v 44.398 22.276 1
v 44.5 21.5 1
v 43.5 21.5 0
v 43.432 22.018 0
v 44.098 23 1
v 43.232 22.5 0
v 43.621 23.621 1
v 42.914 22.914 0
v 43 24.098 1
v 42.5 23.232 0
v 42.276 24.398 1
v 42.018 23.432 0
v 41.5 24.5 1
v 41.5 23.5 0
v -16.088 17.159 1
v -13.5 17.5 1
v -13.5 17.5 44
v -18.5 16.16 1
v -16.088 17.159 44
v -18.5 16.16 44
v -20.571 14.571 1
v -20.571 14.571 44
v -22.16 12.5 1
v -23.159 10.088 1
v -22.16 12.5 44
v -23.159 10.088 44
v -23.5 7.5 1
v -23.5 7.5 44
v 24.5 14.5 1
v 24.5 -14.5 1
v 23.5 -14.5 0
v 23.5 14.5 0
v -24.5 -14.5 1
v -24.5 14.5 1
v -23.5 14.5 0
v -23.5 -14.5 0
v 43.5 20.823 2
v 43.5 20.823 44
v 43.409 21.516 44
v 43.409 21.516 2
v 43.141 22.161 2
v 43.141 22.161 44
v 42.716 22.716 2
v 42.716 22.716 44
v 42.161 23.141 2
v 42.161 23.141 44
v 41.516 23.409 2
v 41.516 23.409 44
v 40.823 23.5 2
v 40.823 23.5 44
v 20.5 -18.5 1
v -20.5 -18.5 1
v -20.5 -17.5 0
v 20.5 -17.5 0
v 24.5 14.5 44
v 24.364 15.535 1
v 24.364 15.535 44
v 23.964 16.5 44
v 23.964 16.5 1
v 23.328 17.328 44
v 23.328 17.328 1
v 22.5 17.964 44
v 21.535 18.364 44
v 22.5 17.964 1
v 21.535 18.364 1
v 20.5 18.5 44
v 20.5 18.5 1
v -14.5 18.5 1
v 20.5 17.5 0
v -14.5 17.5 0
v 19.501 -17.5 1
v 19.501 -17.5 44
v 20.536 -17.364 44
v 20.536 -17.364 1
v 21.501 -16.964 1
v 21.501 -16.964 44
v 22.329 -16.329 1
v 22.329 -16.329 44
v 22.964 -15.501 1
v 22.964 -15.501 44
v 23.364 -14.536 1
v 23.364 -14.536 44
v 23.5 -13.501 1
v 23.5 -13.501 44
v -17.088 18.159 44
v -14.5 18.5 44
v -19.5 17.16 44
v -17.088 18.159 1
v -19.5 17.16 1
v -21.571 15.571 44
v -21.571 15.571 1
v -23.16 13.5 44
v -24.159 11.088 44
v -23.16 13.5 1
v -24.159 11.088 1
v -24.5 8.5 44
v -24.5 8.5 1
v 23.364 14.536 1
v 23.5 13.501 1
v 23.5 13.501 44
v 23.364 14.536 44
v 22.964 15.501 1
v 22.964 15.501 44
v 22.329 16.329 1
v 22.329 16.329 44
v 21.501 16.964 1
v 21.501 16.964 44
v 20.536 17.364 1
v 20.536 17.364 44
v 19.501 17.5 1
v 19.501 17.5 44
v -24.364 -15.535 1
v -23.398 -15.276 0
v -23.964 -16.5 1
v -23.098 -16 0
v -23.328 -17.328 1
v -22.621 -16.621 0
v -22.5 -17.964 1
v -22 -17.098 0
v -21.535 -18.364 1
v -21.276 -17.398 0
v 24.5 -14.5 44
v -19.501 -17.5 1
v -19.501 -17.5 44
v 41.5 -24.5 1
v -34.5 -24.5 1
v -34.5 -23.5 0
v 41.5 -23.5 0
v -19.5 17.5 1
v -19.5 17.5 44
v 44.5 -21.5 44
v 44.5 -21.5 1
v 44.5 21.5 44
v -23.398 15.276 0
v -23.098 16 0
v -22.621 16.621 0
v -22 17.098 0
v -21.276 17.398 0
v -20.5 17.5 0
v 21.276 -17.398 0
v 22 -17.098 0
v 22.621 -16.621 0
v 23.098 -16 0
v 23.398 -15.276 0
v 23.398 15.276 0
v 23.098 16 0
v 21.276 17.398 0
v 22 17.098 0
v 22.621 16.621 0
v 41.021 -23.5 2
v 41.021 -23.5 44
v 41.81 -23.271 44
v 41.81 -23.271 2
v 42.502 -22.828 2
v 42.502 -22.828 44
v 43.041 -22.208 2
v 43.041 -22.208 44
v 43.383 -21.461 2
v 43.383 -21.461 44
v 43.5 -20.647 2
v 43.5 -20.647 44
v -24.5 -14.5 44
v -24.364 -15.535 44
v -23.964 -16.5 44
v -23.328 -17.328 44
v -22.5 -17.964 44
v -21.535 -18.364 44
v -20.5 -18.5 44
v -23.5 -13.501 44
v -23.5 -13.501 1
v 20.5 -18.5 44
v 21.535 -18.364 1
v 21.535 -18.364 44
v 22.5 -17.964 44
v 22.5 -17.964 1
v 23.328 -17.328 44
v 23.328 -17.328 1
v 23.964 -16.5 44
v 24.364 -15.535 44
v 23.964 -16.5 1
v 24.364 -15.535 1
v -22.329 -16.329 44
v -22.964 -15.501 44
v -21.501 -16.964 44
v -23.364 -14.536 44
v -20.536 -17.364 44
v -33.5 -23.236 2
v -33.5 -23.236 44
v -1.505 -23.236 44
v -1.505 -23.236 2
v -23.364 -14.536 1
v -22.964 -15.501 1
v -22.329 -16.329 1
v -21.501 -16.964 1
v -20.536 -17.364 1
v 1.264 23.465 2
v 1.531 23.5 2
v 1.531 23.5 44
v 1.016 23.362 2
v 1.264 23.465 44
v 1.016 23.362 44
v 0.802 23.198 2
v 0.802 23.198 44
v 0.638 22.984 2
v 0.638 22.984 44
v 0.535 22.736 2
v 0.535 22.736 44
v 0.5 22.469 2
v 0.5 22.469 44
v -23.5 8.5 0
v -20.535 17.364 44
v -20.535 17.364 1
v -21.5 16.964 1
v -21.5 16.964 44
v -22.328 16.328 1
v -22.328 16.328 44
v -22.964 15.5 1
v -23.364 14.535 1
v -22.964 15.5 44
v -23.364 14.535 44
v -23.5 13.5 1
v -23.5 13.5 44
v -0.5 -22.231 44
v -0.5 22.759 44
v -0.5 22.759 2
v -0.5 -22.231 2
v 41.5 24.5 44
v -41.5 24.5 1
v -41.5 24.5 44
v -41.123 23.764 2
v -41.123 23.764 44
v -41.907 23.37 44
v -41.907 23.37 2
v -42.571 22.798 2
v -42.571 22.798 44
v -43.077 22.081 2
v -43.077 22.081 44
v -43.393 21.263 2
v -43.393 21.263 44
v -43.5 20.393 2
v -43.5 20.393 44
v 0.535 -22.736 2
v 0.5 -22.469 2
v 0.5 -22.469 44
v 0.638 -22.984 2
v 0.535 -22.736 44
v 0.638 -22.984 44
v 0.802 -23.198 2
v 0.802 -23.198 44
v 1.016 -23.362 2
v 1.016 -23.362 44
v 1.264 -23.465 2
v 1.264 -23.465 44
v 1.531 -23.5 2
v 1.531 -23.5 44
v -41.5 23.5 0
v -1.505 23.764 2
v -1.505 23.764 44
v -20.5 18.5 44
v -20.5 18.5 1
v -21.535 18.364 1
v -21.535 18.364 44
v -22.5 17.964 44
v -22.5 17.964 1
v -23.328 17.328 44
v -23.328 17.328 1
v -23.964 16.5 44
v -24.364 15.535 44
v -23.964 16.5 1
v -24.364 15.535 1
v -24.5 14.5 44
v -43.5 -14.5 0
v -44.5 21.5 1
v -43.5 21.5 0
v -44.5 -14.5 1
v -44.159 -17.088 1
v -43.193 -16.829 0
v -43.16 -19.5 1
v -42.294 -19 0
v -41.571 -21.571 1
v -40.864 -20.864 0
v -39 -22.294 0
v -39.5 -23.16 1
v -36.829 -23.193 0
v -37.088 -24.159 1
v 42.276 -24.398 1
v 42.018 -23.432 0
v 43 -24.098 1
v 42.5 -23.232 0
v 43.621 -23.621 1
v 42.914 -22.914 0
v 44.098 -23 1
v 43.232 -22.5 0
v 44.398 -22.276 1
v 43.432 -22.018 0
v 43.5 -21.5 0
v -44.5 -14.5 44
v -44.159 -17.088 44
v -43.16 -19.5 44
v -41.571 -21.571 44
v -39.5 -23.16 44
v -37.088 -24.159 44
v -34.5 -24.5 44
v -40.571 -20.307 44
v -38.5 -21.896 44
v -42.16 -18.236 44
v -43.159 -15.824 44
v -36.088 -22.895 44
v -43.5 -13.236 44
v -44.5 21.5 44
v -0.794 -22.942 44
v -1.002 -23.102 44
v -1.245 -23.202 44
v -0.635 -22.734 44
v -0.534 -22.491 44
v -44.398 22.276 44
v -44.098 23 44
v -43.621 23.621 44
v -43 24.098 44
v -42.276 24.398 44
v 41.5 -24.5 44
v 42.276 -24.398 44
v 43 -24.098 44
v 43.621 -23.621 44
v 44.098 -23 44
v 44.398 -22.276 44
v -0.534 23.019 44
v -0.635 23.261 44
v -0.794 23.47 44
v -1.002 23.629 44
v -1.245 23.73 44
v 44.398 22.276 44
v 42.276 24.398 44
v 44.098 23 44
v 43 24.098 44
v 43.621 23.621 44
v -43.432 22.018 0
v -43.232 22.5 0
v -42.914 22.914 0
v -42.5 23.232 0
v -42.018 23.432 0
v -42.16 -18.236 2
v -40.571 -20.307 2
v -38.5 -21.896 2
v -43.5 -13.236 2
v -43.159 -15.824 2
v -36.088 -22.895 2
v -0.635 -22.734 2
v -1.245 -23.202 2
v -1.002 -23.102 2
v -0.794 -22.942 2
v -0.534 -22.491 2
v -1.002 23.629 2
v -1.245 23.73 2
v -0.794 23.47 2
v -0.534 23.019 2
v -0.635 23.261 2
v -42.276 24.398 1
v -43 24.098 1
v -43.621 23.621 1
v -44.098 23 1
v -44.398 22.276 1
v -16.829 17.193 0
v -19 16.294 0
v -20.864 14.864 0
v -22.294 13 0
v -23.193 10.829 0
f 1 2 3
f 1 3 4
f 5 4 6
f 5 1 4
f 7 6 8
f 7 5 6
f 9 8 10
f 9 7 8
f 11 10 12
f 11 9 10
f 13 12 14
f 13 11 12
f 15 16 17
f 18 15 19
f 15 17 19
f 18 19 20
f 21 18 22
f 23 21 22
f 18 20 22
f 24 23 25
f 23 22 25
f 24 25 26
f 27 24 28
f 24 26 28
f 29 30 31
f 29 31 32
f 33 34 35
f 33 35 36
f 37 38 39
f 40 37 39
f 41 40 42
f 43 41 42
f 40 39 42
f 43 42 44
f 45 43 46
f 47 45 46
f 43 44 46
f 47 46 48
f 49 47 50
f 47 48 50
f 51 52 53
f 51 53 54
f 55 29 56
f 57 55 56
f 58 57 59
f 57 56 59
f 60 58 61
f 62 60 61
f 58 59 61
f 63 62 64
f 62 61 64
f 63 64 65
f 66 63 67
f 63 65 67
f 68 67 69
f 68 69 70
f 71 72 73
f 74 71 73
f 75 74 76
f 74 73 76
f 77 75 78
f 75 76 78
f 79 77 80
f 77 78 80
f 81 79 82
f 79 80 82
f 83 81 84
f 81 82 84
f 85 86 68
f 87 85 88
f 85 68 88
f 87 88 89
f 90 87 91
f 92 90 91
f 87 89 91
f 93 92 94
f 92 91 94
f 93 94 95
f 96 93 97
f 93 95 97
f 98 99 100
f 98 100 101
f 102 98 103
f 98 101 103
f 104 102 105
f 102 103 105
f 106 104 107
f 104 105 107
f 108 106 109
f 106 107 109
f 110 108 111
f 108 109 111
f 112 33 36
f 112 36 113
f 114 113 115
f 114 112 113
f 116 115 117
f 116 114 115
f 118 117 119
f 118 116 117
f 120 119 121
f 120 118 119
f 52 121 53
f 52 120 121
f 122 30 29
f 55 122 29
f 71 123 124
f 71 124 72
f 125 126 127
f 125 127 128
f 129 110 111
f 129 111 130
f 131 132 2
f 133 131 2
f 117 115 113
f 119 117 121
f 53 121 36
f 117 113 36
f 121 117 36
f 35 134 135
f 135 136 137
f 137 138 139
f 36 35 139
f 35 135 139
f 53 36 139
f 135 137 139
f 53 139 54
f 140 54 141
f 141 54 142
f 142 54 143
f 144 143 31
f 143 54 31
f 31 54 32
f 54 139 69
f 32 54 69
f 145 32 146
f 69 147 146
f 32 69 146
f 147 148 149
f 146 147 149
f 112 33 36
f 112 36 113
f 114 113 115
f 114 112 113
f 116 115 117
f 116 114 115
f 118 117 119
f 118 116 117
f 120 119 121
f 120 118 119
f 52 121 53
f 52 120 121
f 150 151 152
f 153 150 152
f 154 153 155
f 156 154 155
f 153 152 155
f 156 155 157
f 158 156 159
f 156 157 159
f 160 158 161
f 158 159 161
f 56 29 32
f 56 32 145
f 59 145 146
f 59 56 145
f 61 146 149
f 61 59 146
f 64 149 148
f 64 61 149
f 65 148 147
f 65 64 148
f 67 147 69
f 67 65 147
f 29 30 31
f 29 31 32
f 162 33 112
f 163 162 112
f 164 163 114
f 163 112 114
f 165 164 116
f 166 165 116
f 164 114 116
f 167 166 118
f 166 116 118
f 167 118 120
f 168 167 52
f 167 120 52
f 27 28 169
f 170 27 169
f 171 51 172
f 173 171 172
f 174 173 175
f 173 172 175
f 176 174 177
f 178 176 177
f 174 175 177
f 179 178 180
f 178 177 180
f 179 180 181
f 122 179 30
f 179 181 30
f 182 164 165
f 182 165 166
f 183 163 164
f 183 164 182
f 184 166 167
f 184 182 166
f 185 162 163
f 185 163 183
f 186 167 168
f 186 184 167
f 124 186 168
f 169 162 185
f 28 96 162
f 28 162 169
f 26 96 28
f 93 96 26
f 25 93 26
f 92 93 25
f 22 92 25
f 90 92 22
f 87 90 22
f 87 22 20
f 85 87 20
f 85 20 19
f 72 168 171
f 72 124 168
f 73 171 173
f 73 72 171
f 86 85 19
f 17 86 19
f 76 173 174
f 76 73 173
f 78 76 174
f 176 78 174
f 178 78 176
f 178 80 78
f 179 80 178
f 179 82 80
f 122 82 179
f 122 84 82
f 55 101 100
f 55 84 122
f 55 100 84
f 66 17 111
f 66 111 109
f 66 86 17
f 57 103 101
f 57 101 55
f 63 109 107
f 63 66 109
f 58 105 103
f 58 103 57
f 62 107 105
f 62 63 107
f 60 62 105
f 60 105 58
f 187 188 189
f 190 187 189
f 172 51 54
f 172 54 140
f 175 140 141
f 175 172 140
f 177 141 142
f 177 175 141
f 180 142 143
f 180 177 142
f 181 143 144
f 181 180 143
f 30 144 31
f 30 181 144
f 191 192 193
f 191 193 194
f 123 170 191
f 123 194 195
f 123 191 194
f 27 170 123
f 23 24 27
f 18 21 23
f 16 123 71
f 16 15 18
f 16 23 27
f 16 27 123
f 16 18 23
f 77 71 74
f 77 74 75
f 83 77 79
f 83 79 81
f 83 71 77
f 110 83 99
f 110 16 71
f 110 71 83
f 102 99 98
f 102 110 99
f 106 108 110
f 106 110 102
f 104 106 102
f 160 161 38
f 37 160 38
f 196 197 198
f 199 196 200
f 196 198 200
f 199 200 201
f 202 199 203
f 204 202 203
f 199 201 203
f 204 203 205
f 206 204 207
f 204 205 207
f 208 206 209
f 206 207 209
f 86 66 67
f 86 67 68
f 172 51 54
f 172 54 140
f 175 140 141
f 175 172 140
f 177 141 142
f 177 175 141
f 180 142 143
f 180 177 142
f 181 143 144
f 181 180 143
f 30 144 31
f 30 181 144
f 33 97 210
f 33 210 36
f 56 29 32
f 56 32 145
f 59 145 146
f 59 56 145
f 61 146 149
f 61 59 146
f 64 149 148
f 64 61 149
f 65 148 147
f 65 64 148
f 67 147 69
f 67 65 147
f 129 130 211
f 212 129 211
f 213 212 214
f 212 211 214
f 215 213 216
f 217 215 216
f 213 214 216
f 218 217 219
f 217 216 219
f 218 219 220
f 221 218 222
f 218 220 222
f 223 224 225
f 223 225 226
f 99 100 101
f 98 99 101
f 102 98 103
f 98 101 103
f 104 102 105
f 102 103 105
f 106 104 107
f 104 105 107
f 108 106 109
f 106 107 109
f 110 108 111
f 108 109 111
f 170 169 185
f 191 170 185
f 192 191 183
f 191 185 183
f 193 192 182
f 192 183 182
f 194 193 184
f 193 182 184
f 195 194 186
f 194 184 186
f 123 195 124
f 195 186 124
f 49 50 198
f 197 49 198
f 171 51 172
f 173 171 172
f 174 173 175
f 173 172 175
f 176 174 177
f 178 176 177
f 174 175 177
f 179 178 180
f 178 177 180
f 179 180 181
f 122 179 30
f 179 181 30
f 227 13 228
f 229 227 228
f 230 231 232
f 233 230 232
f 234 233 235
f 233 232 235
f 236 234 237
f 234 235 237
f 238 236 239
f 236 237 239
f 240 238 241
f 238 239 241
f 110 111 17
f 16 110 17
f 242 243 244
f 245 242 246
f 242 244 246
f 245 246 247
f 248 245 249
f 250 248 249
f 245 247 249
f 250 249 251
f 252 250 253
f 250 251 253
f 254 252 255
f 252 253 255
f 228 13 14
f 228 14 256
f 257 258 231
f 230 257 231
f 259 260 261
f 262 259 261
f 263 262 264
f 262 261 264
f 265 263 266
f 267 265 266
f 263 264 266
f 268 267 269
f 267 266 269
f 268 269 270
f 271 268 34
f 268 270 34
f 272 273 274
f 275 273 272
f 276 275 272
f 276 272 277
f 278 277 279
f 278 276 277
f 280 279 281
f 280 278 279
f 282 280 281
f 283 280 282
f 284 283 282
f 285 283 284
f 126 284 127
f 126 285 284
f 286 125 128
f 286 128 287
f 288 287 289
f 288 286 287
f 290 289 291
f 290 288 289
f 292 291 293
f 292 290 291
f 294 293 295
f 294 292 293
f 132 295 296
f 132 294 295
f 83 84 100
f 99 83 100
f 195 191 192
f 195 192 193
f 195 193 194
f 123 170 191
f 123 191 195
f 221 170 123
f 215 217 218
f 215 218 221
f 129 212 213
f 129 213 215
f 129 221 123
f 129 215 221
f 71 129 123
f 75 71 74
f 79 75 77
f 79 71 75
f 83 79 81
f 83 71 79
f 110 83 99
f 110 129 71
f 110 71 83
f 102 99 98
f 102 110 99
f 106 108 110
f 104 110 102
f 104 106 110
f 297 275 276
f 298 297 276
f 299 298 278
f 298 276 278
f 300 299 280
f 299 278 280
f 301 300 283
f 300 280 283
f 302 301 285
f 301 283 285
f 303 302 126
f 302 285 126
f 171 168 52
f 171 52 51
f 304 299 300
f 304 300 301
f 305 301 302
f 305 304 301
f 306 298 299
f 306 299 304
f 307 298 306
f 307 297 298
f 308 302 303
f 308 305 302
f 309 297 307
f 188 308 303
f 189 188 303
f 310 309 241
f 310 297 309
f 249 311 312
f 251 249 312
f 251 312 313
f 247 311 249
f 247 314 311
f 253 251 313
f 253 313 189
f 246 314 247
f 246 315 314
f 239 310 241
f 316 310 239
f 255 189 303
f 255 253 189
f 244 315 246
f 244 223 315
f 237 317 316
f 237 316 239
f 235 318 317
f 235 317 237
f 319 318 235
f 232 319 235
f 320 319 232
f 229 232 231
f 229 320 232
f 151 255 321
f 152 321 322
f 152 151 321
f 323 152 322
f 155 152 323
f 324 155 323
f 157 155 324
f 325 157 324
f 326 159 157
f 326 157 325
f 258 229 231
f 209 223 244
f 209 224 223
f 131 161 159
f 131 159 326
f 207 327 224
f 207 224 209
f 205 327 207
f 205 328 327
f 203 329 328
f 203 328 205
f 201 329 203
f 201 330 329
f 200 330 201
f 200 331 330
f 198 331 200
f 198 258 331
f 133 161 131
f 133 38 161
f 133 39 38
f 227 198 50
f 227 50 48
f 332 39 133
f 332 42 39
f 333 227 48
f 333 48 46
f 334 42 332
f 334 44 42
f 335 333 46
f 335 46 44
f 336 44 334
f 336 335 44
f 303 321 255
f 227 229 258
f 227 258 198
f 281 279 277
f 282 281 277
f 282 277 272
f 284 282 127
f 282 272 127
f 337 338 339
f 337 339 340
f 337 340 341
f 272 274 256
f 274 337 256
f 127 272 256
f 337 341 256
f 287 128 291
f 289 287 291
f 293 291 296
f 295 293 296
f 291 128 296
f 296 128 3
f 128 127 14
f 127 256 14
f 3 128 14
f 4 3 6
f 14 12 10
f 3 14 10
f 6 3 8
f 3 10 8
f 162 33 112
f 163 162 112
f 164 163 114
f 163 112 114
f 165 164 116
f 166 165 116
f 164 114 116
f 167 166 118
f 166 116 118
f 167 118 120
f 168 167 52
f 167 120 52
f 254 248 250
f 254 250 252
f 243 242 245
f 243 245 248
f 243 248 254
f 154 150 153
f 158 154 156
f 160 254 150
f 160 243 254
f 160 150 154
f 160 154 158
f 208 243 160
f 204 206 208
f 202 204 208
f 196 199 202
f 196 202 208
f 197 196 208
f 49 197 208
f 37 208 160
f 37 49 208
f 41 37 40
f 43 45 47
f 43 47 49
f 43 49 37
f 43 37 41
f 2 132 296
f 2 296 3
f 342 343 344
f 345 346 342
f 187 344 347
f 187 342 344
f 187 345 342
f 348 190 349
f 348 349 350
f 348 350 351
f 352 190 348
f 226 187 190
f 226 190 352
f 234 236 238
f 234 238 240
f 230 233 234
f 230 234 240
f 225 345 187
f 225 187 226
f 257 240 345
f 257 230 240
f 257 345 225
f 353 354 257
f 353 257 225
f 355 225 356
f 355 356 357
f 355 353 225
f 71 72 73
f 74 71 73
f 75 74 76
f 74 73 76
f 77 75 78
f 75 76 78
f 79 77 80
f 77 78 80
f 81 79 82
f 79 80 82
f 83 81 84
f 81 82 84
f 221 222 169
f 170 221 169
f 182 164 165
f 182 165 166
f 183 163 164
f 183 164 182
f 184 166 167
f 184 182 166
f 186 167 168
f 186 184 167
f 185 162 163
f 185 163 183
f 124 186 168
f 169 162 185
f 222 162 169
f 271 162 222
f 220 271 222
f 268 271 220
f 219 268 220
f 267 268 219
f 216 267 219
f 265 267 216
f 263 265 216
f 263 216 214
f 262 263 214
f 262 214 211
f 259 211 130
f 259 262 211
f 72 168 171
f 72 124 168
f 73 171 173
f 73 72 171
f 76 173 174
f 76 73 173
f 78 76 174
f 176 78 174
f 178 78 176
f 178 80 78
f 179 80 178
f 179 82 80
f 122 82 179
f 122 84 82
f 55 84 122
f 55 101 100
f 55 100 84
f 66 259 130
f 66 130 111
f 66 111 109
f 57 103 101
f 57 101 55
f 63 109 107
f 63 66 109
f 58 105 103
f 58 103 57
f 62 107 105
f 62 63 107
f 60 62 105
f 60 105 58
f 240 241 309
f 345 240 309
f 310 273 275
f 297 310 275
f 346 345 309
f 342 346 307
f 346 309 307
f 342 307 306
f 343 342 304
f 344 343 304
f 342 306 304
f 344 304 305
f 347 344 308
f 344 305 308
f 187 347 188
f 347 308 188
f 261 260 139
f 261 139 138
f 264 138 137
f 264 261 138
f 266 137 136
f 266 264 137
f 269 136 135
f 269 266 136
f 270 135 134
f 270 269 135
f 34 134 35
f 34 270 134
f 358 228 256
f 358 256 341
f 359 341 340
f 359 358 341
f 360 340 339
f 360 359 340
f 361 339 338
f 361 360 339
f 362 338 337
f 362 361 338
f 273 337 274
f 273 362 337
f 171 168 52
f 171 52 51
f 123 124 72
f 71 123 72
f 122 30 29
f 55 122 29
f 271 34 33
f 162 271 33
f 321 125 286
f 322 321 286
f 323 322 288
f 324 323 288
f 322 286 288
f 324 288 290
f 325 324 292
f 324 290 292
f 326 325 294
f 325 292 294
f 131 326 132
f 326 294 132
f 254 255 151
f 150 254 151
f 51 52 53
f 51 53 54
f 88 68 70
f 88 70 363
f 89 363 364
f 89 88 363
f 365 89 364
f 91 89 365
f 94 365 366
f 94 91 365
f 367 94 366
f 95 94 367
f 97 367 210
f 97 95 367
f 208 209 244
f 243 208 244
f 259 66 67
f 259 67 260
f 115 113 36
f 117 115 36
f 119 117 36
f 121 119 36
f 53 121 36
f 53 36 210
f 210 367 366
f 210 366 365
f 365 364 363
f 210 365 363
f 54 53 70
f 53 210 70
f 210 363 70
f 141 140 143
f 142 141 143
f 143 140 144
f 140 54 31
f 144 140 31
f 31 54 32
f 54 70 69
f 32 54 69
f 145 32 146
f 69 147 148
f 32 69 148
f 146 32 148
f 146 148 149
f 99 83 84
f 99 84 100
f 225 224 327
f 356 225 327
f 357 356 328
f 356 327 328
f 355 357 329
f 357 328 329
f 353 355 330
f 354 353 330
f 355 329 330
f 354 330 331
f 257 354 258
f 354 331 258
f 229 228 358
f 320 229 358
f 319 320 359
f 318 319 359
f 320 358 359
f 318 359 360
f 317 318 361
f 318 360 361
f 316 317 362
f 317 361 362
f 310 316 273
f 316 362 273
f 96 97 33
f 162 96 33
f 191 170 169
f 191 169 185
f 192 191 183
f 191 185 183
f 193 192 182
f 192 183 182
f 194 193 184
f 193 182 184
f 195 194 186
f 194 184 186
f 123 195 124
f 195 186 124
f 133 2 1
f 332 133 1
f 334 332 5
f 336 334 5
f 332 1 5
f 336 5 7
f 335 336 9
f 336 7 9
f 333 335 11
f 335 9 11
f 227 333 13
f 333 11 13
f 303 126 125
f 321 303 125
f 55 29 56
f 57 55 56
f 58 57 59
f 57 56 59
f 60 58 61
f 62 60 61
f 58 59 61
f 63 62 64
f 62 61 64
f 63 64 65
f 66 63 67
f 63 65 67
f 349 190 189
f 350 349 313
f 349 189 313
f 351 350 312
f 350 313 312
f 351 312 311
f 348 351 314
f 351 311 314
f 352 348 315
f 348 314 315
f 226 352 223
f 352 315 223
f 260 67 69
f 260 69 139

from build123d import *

# Parameters (mm, degrees)
PAD_DEPTH       = 44
POCKET_DEPTH    = 43
CHAMFER_SIZE    = 1
PAD001_DEPTH    = 44
POCKET001_DEPTH = 42
CHAMFER001_SIZE = 1
PAD002_DEPTH    = 44
POCKET002_DEPTH = 43
CHAMFER002_SIZE = 1


with BuildPart() as body:
    # Sketch → Pad (new body)
    with BuildSketch(Plane.XY):
        with BuildLine():
            Line((-24.5, 8.5), (-24.5, -14.5))
            ThreePointArc((-24.5, -14.5), (-23.328427, -17.328427), (-20.5, -18.5))
            Line((-20.5, -18.5), (20.5, -18.5))
            ThreePointArc((20.5, -18.5), (23.328427, -17.328427), (24.5, -14.5))
            Line((24.5, -14.5), (24.5, 14.5))
            ThreePointArc((24.5, 14.5), (23.328427, 17.328427), (20.5, 18.5))
            Line((20.5, 18.5), (-14.5, 18.5))
            ThreePointArc((-14.5, 18.5), (-21.571068, 15.571068), (-24.5, 8.5))
        make_face()
    extrude(amount=PAD_DEPTH)

    # Sketch001 (on Face10 of Pad) → Pocket (cut)
    with BuildSketch(Plane.XY.offset(44)):
        with BuildLine():
            Line((-23.5, 7.5), (-23.5, -13.501274))
            ThreePointArc((-23.5, -13.501274), (-22.3288, -16.3288), (-19.501274, -17.5))
            Line((-19.501274, -17.5), (19.501274, -17.5))
            ThreePointArc((19.501274, -17.5), (22.3288, -16.3288), (23.5, -13.501274))
            Line((23.5, -13.501274), (23.5, 13.501274))
            ThreePointArc((23.5, 13.501274), (22.3288, 16.3288), (19.501274, 17.5))
            Line((19.501274, 17.5), (-13.5, 17.5))
            ThreePointArc((-13.5, 17.5), (-20.571068, 14.571068), (-23.5, 7.5))
        make_face()
    extrude(amount=-POCKET_DEPTH, mode=Mode.SUBTRACT)

    # Chamfer
    chamfer_edges = [body.edges().sort_by_distance(p)[0] for p in [
        (0, -18.5, 0),
        (23.328427, -17.328427, 0),
        (24.5, 0, 0),
        (23.328427, 17.328427, 0),
        (3, 18.5, 0),
        (-21.571068, 15.571068, 0),
        (-24.5, -3, 0),
        (-23.328427, -17.328427, 0),
    ]]
    chamfer(chamfer_edges, length=CHAMFER_SIZE)


with BuildPart() as body001:
    # Sketch002 → Pad001 (new body)
    with BuildSketch(Plane.XY):
        with BuildLine():
            Line((-44.5, 21.5), (-44.5, -14.5))
            ThreePointArc((-44.5, -14.5), (-41.571068, -21.571068), (-34.5, -24.5))
            Line((-34.5, -24.5), (41.5, -24.5))
            ThreePointArc((41.5, -24.5), (43.62132, -23.62132), (44.5, -21.5))
            Line((44.5, -21.5), (44.5, 21.5))
            ThreePointArc((44.5, 21.5), (43.62132, 23.62132), (41.5, 24.5))
            Line((41.5, 24.5), (-41.5, 24.5))
            ThreePointArc((-41.5, 24.5), (-43.62132, 23.62132), (-44.5, 21.5))
        make_face()
    extrude(amount=PAD001_DEPTH)

    # Sketch003 (on Face10 of Pad001) → Pocket001 (cut)
    with BuildSketch(Plane.XY.offset(44)):
        with BuildLine():
            Line((-43.5, 20.392611), (-43.5, -13.236164))
            ThreePointArc((-43.5, -13.236164), (-40.571068, -20.307232), (-33.5, -23.236164))
            Line((-33.5, -23.236164), (-1.504851, -23.236164))
            ThreePointArc((-1.504851, -23.236164), (-0.794314, -22.94185), (-0.5, -22.231313))
            Line((-0.5, 22.758984), (-0.5, -22.231313))
            ThreePointArc((-0.5, 22.758984), (-0.794314, 23.469522), (-1.504851, 23.763836))
            Line((-1.504851, 23.763836), (-41.123325, 23.763836))
            ThreePointArc((-41.123325, 23.763836), (-42.846102, 22.454997), (-43.5, 20.392611))
        make_face()
        with BuildLine():
            Line((43.5, -20.647457), (43.5, 20.822941))
            ThreePointArc((43.5, 20.822941), (42.715908, 22.715908), (40.822941, 23.5))
            Line((40.822941, 23.5), (1.531368, 23.5))
            ThreePointArc((1.531368, 23.5), (0.802081, 23.197919), (0.5, 22.468632))
            Line((0.5, 22.468632), (0.5, -22.468632))
            ThreePointArc((0.5, -22.468632), (0.802081, -23.197919), (1.531368, -23.5))
            Line((1.531368, -23.5), (41.020852, -23.5))
            ThreePointArc((41.020852, -23.5), (42.793601, -22.537111), (43.5, -20.647457))
        make_face()
    extrude(amount=-POCKET001_DEPTH, mode=Mode.SUBTRACT)

    # Chamfer001
    chamfer001_edges = [body001.edges().sort_by_distance(p)[0] for p in [
        (3.5, -24.5, 0),
        (43.62132, -23.62132, 0),
        (44.5, 0, 0),
        (43.62132, 23.62132, 0),
        (0, 24.5, 0),
        (-44.5, 3.5, 0),
        (-41.571068, -21.571068, 0),
        (-43.62132, 23.62132, 0),
    ]]
    chamfer(chamfer001_edges, length=CHAMFER001_SIZE)


with BuildPart() as body002:
    # Sketch004 → Pad002 (new body)
    with BuildSketch(Plane.XY):
        with BuildLine():
            Line((-24.5, 14.5), (-24.5, -14.5))
            ThreePointArc((-24.5, -14.5), (-23.328427, -17.328427), (-20.5, -18.5))
            Line((-20.5, -18.5), (20.5, -18.5))
            ThreePointArc((20.5, -18.5), (23.328427, -17.328427), (24.5, -14.5))
            Line((24.5, -14.5), (24.5, 14.5))
            ThreePointArc((24.5, 14.5), (23.328427, 17.328427), (20.5, 18.5))
            Line((20.5, 18.5), (-20.5, 18.5))
            ThreePointArc((-20.5, 18.5), (-23.328427, 17.328427), (-24.5, 14.5))
        make_face()
    extrude(amount=PAD002_DEPTH)

    # Sketch005 (on Face10 of Pad002) → Pocket002 (cut)
    with BuildSketch(Plane.XY.offset(44)):
        with BuildLine():
            Line((-23.5, 13.5), (-23.5, -13.501261))
            ThreePointArc((-23.5, -13.501261), (-22.328796, -16.328796), (-19.501261, -17.5))
            Line((-19.501261, -17.5), (19.501261, -17.5))
            ThreePointArc((19.501261, -17.5), (22.328796, -16.328796), (23.5, -13.501261))
            Line((23.5, -13.501261), (23.5, 13.501261))
            ThreePointArc((23.5, 13.501261), (22.328796, 16.328796), (19.501261, 17.5))
            Line((19.501261, 17.5), (-19.5, 17.5))
            ThreePointArc((-19.5, 17.5), (-22.328427, 16.328427), (-23.5, 13.5))
        make_face()
    extrude(amount=-POCKET002_DEPTH, mode=Mode.SUBTRACT)

    # Chamfer002
    chamfer002_edges = [body002.edges().sort_by_distance(p)[0] for p in [
        (0, -18.5, 0),
        (23.328427, -17.328427, 0),
        (24.5, 0, 0),
        (23.328427, 17.328427, 0),
        (0, 18.5, 0),
        (-23.328427, 17.328427, 0),
        (-24.5, 0, 0),
        (-23.328427, -17.328427, 0),
    ]]
    chamfer(chamfer002_edges, length=CHAMFER002_SIZE)


solid = Compound([body.part, body001.part, body002.part])
